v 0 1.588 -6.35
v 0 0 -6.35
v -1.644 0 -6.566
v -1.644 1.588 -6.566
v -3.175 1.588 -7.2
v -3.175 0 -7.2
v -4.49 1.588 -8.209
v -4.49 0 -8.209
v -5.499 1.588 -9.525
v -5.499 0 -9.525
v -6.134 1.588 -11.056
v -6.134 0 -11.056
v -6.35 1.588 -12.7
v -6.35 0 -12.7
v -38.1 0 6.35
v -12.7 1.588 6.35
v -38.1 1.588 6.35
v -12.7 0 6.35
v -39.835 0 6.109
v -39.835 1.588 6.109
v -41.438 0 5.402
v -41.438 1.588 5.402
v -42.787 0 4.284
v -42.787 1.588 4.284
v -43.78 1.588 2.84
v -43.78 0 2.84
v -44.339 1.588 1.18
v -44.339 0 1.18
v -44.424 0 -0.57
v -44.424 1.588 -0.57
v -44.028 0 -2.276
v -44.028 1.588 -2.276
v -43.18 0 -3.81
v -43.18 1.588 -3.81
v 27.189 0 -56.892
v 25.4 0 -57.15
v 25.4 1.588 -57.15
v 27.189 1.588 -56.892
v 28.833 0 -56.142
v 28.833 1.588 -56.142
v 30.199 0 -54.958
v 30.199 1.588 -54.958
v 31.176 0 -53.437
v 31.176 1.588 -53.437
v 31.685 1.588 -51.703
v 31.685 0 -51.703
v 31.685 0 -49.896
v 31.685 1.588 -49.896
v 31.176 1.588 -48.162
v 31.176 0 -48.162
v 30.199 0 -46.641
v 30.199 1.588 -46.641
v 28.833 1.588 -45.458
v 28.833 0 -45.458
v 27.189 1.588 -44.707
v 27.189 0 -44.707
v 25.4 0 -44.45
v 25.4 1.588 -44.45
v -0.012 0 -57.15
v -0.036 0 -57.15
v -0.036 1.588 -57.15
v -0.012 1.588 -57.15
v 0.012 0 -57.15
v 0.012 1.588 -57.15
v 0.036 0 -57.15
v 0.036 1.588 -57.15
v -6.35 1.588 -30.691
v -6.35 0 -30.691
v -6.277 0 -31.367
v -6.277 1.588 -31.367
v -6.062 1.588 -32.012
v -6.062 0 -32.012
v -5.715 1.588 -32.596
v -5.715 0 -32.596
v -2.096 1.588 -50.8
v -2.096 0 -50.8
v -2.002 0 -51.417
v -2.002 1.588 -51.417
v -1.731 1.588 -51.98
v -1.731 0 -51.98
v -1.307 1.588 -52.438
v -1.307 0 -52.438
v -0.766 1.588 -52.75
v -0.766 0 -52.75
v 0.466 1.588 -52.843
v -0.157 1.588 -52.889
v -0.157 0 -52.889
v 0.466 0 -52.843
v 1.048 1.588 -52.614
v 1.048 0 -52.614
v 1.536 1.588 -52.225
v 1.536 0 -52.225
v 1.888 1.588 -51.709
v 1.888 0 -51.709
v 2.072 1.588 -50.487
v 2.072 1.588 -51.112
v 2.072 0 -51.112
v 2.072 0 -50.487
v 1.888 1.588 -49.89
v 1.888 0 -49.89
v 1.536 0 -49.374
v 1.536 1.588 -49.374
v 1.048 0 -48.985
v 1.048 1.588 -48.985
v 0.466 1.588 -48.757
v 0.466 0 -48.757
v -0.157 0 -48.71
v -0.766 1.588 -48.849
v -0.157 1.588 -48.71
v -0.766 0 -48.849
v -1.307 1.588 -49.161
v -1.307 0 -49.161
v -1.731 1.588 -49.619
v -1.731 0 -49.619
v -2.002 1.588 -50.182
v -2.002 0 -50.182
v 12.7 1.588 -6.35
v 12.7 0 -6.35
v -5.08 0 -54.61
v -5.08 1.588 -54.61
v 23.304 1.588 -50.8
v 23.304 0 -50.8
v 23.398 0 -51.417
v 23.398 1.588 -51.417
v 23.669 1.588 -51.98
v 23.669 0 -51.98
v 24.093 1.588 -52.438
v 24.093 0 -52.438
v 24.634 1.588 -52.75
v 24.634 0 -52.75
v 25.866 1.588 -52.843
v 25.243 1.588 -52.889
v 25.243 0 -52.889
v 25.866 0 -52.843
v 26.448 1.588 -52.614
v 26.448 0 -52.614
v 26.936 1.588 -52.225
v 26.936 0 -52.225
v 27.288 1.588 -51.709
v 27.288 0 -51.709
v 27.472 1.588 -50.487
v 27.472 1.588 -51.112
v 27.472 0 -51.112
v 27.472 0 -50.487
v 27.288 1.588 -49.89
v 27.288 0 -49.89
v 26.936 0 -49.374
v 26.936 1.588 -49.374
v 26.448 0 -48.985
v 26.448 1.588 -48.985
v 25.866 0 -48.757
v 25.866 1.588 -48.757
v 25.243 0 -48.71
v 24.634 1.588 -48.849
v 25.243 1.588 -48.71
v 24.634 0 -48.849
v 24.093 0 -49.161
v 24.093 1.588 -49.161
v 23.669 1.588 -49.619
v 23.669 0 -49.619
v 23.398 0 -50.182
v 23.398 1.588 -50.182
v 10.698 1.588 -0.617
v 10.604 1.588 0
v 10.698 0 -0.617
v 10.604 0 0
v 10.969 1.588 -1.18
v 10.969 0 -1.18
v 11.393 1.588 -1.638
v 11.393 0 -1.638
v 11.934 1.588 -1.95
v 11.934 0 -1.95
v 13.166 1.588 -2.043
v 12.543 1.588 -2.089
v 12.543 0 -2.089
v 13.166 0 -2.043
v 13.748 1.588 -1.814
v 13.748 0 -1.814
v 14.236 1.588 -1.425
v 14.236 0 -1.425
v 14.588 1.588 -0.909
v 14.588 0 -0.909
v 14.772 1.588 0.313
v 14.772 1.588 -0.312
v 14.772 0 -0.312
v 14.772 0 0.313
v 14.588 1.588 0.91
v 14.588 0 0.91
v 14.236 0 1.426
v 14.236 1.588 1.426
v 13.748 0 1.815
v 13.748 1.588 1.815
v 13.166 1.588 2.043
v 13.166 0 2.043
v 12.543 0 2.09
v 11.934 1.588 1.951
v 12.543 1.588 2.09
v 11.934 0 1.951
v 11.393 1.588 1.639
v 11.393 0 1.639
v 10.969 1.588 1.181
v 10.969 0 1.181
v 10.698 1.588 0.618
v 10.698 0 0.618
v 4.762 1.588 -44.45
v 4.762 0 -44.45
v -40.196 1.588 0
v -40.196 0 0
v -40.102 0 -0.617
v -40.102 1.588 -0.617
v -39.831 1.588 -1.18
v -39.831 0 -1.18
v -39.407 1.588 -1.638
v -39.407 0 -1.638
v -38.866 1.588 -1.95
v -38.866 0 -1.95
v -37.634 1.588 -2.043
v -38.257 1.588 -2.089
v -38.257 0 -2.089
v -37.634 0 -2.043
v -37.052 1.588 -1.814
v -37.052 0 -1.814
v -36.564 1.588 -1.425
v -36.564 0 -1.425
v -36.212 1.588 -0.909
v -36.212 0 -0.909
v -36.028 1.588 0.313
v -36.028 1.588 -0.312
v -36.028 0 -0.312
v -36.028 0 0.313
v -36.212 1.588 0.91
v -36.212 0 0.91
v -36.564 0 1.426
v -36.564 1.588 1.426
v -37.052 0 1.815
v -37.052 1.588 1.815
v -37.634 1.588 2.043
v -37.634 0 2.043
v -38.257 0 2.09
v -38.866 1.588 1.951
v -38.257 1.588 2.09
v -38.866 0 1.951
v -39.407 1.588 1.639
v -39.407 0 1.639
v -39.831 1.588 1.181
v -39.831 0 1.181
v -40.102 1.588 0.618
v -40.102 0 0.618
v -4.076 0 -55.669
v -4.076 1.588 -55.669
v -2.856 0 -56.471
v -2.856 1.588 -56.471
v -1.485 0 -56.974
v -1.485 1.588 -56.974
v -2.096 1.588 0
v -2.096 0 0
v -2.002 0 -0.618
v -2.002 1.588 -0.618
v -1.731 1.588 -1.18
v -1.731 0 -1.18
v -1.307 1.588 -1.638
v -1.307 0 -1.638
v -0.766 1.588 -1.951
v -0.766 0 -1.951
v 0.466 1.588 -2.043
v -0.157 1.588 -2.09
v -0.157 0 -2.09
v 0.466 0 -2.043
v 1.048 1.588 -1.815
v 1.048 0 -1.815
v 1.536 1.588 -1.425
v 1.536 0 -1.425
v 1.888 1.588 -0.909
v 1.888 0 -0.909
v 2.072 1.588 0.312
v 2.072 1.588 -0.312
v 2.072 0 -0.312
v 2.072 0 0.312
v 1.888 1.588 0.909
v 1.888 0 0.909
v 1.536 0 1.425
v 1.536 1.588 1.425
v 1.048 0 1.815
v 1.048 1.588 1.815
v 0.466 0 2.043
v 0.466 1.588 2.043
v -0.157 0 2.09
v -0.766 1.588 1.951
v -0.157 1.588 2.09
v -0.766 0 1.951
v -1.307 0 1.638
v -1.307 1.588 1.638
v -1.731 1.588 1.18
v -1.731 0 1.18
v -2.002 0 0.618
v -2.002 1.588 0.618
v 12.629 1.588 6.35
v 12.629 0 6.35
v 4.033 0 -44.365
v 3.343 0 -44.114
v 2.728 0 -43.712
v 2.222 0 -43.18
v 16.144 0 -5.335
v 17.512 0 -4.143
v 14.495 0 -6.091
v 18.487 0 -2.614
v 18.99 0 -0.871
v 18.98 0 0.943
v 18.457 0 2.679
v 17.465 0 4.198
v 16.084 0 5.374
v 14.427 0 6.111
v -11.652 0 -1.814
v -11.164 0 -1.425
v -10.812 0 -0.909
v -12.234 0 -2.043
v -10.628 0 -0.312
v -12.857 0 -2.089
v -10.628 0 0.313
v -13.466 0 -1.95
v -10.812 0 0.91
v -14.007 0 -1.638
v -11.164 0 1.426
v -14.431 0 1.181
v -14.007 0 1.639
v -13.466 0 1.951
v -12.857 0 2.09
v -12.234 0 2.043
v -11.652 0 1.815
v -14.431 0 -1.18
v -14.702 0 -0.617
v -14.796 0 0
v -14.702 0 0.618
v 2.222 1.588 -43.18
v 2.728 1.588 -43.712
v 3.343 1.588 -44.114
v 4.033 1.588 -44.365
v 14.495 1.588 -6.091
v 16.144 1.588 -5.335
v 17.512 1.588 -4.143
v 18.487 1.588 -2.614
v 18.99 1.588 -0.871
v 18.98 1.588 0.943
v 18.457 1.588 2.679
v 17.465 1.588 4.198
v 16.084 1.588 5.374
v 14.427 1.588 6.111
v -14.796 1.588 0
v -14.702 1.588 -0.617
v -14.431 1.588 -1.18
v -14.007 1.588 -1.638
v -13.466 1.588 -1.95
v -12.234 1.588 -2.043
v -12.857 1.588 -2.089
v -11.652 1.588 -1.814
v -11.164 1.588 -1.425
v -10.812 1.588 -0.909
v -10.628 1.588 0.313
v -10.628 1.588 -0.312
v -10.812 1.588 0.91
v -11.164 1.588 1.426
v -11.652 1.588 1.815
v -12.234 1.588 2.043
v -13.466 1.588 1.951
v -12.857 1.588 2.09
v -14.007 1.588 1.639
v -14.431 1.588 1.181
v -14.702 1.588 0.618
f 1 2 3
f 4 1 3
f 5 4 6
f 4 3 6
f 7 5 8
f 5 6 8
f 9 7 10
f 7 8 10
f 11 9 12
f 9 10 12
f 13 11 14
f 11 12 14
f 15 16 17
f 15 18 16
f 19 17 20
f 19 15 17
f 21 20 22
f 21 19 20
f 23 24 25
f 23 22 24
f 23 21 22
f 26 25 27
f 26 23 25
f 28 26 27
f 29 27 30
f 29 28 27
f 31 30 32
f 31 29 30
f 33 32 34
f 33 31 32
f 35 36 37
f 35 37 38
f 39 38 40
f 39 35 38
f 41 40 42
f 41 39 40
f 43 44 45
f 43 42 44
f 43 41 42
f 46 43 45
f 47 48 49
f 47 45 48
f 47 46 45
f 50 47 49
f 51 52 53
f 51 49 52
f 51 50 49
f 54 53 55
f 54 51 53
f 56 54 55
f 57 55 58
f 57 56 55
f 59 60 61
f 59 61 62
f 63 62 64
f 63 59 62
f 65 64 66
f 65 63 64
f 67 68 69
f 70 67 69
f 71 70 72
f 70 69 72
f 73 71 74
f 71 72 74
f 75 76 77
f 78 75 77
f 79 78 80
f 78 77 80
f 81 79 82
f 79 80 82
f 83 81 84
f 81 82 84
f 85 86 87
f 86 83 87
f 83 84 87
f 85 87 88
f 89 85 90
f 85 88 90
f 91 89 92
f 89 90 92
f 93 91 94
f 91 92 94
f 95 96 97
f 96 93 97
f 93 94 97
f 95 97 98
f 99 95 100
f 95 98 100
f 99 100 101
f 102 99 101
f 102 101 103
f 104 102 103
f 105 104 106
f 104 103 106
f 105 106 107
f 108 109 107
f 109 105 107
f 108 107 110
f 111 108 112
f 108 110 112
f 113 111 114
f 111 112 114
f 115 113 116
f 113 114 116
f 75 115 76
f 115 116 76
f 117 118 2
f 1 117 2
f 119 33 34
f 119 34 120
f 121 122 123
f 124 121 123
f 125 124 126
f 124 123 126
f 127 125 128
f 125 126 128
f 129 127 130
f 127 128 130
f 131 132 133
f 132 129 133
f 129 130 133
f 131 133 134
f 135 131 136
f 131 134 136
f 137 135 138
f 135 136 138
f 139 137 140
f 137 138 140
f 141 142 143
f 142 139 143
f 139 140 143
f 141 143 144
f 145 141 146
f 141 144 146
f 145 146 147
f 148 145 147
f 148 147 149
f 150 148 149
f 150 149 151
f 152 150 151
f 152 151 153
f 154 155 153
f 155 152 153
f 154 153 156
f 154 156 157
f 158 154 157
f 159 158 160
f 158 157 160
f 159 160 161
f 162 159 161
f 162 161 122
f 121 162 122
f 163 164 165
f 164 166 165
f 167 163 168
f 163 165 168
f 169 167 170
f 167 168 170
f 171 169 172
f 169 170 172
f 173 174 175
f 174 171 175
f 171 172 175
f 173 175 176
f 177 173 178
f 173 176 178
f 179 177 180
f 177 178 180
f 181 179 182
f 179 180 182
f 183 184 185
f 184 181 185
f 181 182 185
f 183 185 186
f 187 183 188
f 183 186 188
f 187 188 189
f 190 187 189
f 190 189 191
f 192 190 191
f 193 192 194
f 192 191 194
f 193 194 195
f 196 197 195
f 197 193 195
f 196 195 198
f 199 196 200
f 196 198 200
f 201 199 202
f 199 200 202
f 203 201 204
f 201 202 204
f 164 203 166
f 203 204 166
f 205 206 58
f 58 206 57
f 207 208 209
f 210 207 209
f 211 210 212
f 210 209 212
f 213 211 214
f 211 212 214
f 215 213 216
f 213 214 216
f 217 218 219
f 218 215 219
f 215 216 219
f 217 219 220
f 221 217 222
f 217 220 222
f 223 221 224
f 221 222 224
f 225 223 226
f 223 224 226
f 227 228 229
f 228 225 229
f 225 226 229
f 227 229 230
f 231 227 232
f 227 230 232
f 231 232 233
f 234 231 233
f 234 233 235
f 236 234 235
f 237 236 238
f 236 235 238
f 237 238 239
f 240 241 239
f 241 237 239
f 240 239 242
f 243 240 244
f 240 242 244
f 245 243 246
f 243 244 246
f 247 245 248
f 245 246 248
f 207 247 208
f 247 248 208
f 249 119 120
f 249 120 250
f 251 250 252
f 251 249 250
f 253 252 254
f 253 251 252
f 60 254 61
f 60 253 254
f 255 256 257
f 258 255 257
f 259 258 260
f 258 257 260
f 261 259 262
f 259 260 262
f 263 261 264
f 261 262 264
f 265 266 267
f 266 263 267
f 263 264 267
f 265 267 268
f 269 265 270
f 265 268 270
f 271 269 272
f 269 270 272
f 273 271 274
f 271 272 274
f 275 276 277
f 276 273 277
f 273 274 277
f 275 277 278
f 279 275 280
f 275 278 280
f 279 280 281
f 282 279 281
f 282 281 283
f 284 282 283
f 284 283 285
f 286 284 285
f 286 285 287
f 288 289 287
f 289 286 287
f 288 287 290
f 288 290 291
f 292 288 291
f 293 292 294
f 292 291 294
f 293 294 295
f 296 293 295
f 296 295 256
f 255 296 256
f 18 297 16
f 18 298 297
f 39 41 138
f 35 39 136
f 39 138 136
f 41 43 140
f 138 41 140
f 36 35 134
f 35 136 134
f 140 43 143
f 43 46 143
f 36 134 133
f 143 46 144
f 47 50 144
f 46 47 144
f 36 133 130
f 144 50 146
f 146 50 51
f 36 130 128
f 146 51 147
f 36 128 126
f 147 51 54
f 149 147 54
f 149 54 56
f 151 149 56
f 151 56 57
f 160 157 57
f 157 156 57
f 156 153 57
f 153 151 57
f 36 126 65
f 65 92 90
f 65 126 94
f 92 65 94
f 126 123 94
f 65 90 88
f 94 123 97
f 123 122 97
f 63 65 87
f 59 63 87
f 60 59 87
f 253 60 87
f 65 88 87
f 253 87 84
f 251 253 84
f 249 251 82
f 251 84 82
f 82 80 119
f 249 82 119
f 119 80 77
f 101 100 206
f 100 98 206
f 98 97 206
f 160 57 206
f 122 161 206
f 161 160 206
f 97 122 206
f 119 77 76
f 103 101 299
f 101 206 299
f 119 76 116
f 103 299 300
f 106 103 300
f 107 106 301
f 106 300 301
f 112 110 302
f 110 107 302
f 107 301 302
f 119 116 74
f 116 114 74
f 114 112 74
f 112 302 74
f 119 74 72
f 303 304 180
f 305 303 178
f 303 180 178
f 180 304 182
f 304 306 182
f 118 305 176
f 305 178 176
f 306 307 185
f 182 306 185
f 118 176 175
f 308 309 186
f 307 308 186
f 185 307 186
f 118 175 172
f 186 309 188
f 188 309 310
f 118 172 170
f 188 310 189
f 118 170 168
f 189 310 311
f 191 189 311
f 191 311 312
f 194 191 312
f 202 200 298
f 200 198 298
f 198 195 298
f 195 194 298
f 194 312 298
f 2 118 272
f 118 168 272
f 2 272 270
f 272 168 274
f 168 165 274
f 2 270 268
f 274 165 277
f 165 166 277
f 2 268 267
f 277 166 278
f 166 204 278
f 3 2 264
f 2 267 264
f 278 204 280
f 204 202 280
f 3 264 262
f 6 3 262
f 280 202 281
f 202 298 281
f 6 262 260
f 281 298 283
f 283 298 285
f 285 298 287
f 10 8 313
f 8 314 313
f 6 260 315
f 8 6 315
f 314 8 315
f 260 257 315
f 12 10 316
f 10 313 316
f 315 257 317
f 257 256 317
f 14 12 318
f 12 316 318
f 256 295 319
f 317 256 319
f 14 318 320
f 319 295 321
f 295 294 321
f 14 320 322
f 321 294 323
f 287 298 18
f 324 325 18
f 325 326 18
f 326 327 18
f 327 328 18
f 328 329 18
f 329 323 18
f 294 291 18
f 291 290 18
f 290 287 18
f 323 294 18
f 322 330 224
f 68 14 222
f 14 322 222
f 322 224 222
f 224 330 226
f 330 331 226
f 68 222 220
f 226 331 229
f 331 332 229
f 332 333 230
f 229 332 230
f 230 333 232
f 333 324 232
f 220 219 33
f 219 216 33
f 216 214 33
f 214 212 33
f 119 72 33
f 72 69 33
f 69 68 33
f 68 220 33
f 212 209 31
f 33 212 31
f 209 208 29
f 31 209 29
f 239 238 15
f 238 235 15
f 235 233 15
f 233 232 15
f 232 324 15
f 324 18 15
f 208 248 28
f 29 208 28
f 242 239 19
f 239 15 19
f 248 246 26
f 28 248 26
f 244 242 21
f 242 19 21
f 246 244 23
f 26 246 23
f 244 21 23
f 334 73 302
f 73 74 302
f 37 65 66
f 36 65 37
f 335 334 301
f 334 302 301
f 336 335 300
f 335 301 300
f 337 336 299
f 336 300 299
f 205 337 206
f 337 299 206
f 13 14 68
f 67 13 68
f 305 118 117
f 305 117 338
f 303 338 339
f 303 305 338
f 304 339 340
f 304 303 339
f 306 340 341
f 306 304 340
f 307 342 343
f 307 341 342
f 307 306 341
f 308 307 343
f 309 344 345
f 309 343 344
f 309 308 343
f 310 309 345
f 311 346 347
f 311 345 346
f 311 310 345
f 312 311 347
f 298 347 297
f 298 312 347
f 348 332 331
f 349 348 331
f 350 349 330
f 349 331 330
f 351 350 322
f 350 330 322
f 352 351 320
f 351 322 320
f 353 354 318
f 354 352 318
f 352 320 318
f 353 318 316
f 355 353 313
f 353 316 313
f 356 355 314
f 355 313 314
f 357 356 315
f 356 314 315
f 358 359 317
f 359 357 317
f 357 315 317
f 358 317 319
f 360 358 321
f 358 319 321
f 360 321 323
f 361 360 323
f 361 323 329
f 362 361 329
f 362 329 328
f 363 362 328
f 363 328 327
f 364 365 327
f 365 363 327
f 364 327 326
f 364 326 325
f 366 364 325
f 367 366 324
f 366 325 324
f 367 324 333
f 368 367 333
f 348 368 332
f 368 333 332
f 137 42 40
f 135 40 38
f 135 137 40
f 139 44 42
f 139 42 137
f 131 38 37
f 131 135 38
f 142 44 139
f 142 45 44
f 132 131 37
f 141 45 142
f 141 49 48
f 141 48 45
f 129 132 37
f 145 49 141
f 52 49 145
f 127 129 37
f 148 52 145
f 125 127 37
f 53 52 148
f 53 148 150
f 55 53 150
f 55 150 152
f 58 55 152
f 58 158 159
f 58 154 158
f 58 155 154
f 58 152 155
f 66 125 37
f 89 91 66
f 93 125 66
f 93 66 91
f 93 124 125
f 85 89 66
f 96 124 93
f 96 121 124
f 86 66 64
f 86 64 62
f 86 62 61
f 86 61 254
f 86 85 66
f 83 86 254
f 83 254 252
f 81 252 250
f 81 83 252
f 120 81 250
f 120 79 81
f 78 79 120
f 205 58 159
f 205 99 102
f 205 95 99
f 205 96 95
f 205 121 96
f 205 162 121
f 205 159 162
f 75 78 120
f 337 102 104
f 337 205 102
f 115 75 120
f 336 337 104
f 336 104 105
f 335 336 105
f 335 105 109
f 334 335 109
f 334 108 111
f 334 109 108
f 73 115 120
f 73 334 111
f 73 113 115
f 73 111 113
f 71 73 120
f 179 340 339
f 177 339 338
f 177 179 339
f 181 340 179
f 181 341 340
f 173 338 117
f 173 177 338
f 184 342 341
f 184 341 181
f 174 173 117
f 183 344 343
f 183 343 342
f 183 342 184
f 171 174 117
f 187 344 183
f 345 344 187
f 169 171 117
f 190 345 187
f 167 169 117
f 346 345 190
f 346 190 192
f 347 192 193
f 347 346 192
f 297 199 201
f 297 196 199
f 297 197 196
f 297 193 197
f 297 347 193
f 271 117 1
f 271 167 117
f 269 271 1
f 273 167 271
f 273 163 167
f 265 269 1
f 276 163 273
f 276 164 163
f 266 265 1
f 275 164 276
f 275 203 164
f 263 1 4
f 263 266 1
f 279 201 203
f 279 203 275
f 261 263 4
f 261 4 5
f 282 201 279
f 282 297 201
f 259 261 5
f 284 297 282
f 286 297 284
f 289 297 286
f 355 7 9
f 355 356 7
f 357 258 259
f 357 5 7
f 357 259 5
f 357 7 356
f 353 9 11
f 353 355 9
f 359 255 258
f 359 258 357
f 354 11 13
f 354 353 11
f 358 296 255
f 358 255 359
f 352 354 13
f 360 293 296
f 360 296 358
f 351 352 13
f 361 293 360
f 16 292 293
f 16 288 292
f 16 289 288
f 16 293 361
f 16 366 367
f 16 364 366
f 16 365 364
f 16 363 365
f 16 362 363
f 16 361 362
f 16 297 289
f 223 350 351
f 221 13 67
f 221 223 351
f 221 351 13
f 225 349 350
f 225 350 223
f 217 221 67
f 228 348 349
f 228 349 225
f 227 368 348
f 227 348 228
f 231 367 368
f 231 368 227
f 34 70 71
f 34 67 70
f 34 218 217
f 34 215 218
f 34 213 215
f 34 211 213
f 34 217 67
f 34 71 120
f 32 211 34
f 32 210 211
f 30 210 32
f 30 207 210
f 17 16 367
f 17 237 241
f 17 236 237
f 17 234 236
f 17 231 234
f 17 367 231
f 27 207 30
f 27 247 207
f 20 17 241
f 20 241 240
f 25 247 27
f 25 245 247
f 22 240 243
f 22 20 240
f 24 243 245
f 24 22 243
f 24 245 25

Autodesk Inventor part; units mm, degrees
ref_plane "YZ Plane" through (0, 0, 0) normal (1, 0, 0) x (0, 1, 0)
ref_plane "XZ Plane" through (0, 0, 0) normal (0, 1, 0) x (-1, 0, 0)
ref_plane "XY Plane" through (0, 0, 0) normal (0, 0, 1) x (1, 0, 0)
sketch "main" plane through (0, 0, 0) normal (0, 0, 1) x (1, 0, 0)
  arc A0 (-6.1043, -28.9805) -> (-0.9888, -26.4406) centre (-6.0688, -22.6306) ccw
  arc A1 (-31.4687, -16.2806) -> (-31.4687, -28.9806) centre (-31.4688, -22.6306) ccw
  circle A2 centre (-6.0688, -22.6306) radius 2.0955
  circle A3 centre (-31.4688, -22.6306) radius 2.0955
  line L0 (-10.8313, -16.2806) -> (-31.4688, -16.2806)
  line L1 (-6.0331, -28.9805) -> (-31.4687, -28.9806)
  circle A4 centre (-6.0688, 28.169) radius 2.0955
  circle A5 centre (6.6312, 28.1694) radius 2.0955
  line L2 (0.2812, 15.4694) -> (0.2812, -2.5222)
  line L3 (37.1112, 24.3594) -> (-0.9888, -26.4406)
  line L4 (-18.7688, 21.8194) -> (-6.0688, 21.8194)
  arc A6 (0.2812, 15.4694) -> (-6.0688, 21.8194) centre (-6.0688, 15.4694) ccw
  arc A7 (-18.6975, 34.519) -> (-18.7688, 21.8194) centre (-18.7688, 28.1694) ccw
  line L5 (-18.6975, 34.519) -> (6.6312, 34.519)
  circle A8 centre (32.0312, 28.1694) radius 2.0955
  arc A9 (37.1112, 24.3594) -> (32.0311, 34.5194) centre (32.0312, 28.1694) ccw
  line L6 (6.6311, 34.519) -> (32.0311, 34.5194)
  circle A10 centre (-18.7688, 28.1694) radius 2.0956
  line L7 (-0.3538, -4.4272) -> (-8.2913, -15.0106)
  arc A11 (-10.8313, -16.2806) -> (-8.2913, -15.0106) centre (-10.8313, -13.1056) ccw
  arc A12 (-0.3538, -4.4272) -> (0.2812, -2.5222) centre (-2.8938, -2.5222) ccw
  point P0 (-4.0049, 2.2465)
  point P1 (0.2812, -3.5806)
  dimension "d0" = 4.191
  dimension "d1" = 4.191
  dimension "d2" = 12.7
  dimension "d4" = 6.35
  dimension "d7" = 6.35
  dimension "d8" = 25.4
  dimension "d9" = 3.175
sketch "Sketch1" plane through (0, 0, 0) normal (0, 1, 0) x (-1, 0, 0)
  arc A0 (-0.0356, -57.1495) -> (5.08, -54.6096) centre (0, -50.7996) ccw
  arc A1 (-25.4, -44.4496) -> (-25.4, -57.1496) centre (-25.4, -50.7996) ccw
  circle A2 centre (0, -50.7996) radius 2.0955
  circle A3 centre (-25.4, -50.7996) radius 2.0955
  line L0 (-4.7625, -44.4496) -> (-25.4, -44.4496)
  line L1 (0.0356, -57.1495) -> (-25.4, -57.1496)
  circle A4 centre (0, 0) radius 2.0955
  circle A5 centre (12.7, 0.0004) radius 2.0955
  line L2 (6.35, -12.6996) -> (6.35, -30.6913)
  line L3 (43.18, -3.8096) -> (5.08, -54.6096)
  line L4 (-12.7, -6.3496) -> (0, -6.3496)
  arc A6 (6.35, -12.6996) -> (0, -6.3496) centre (0, -12.6996) ccw
  arc A7 (-12.6287, 6.35) -> (-12.7, -6.3496) centre (-12.7, 0.0004) ccw
  line L5 (-12.6287, 6.35) -> (12.7, 6.35)
  circle A8 centre (38.1, 0.0004) radius 2.0955
  arc A9 (43.18, -3.8096) -> (38.0999, 6.3504) centre (38.1, 0.0004) ccw
  line L6 (12.6999, 6.35) -> (38.0999, 6.3504)
  circle A10 centre (-12.7, 0.0004) radius 2.0956
  line L7 (5.715, -32.5963) -> (-2.2225, -43.1796)
  arc A11 (-4.7625, -44.4496) -> (-2.2225, -43.1796) centre (-4.7625, -41.2746) ccw
  arc A12 (5.715, -32.5963) -> (6.35, -30.6913) centre (3.175, -30.6913) ccw
  point P0 (12.7, 6.35)
  point P1 (12.7, 6.35)
extrude "Extrusion1" add sketch "Sketch1" along normal blind 1.5875
properties part number "gusset" material "Acetal Resin, White"
